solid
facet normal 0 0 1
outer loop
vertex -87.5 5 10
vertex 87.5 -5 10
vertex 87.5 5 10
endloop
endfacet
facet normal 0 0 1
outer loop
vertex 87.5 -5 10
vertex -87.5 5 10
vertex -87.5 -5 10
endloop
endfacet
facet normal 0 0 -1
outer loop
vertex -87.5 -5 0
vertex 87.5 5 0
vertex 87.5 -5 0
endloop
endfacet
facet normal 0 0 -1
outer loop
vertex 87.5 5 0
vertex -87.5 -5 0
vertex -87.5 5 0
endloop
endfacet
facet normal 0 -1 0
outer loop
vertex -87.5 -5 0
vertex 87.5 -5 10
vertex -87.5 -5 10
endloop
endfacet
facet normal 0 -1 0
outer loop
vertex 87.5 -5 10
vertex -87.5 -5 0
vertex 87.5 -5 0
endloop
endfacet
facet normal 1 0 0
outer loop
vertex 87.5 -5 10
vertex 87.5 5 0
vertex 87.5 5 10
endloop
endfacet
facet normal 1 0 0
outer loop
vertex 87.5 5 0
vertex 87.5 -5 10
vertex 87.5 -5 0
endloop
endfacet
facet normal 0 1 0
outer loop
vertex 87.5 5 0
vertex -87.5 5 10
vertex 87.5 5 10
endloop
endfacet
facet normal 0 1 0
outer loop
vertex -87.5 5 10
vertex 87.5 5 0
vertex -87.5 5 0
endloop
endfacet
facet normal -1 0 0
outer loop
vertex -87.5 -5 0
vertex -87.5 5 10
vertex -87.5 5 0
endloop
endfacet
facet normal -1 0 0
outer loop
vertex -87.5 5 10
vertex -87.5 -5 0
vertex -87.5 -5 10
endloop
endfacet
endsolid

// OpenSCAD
/* ==========================================================================
   PROJETO CAMPO TÁTIL - BARRAS LINEARES QUADRADAS DO EIXO Y (10x10x175mm)
   Eixo guia da ponte móvel que corre no sentido X (esquerda para a direita)
   ========================================================================== */

largura_barra = 10;       
altura_barra = 10;        
comprimento_barra = 175;  // Comprimento correto de esquerda a direita

module barra_quadrada_y() {
    color("silver")
        translate([0, 0, altura_barra/2])
            cube([comprimento_barra, largura_barra, altura_barra], center=true);
}

barra_quadrada_y();
